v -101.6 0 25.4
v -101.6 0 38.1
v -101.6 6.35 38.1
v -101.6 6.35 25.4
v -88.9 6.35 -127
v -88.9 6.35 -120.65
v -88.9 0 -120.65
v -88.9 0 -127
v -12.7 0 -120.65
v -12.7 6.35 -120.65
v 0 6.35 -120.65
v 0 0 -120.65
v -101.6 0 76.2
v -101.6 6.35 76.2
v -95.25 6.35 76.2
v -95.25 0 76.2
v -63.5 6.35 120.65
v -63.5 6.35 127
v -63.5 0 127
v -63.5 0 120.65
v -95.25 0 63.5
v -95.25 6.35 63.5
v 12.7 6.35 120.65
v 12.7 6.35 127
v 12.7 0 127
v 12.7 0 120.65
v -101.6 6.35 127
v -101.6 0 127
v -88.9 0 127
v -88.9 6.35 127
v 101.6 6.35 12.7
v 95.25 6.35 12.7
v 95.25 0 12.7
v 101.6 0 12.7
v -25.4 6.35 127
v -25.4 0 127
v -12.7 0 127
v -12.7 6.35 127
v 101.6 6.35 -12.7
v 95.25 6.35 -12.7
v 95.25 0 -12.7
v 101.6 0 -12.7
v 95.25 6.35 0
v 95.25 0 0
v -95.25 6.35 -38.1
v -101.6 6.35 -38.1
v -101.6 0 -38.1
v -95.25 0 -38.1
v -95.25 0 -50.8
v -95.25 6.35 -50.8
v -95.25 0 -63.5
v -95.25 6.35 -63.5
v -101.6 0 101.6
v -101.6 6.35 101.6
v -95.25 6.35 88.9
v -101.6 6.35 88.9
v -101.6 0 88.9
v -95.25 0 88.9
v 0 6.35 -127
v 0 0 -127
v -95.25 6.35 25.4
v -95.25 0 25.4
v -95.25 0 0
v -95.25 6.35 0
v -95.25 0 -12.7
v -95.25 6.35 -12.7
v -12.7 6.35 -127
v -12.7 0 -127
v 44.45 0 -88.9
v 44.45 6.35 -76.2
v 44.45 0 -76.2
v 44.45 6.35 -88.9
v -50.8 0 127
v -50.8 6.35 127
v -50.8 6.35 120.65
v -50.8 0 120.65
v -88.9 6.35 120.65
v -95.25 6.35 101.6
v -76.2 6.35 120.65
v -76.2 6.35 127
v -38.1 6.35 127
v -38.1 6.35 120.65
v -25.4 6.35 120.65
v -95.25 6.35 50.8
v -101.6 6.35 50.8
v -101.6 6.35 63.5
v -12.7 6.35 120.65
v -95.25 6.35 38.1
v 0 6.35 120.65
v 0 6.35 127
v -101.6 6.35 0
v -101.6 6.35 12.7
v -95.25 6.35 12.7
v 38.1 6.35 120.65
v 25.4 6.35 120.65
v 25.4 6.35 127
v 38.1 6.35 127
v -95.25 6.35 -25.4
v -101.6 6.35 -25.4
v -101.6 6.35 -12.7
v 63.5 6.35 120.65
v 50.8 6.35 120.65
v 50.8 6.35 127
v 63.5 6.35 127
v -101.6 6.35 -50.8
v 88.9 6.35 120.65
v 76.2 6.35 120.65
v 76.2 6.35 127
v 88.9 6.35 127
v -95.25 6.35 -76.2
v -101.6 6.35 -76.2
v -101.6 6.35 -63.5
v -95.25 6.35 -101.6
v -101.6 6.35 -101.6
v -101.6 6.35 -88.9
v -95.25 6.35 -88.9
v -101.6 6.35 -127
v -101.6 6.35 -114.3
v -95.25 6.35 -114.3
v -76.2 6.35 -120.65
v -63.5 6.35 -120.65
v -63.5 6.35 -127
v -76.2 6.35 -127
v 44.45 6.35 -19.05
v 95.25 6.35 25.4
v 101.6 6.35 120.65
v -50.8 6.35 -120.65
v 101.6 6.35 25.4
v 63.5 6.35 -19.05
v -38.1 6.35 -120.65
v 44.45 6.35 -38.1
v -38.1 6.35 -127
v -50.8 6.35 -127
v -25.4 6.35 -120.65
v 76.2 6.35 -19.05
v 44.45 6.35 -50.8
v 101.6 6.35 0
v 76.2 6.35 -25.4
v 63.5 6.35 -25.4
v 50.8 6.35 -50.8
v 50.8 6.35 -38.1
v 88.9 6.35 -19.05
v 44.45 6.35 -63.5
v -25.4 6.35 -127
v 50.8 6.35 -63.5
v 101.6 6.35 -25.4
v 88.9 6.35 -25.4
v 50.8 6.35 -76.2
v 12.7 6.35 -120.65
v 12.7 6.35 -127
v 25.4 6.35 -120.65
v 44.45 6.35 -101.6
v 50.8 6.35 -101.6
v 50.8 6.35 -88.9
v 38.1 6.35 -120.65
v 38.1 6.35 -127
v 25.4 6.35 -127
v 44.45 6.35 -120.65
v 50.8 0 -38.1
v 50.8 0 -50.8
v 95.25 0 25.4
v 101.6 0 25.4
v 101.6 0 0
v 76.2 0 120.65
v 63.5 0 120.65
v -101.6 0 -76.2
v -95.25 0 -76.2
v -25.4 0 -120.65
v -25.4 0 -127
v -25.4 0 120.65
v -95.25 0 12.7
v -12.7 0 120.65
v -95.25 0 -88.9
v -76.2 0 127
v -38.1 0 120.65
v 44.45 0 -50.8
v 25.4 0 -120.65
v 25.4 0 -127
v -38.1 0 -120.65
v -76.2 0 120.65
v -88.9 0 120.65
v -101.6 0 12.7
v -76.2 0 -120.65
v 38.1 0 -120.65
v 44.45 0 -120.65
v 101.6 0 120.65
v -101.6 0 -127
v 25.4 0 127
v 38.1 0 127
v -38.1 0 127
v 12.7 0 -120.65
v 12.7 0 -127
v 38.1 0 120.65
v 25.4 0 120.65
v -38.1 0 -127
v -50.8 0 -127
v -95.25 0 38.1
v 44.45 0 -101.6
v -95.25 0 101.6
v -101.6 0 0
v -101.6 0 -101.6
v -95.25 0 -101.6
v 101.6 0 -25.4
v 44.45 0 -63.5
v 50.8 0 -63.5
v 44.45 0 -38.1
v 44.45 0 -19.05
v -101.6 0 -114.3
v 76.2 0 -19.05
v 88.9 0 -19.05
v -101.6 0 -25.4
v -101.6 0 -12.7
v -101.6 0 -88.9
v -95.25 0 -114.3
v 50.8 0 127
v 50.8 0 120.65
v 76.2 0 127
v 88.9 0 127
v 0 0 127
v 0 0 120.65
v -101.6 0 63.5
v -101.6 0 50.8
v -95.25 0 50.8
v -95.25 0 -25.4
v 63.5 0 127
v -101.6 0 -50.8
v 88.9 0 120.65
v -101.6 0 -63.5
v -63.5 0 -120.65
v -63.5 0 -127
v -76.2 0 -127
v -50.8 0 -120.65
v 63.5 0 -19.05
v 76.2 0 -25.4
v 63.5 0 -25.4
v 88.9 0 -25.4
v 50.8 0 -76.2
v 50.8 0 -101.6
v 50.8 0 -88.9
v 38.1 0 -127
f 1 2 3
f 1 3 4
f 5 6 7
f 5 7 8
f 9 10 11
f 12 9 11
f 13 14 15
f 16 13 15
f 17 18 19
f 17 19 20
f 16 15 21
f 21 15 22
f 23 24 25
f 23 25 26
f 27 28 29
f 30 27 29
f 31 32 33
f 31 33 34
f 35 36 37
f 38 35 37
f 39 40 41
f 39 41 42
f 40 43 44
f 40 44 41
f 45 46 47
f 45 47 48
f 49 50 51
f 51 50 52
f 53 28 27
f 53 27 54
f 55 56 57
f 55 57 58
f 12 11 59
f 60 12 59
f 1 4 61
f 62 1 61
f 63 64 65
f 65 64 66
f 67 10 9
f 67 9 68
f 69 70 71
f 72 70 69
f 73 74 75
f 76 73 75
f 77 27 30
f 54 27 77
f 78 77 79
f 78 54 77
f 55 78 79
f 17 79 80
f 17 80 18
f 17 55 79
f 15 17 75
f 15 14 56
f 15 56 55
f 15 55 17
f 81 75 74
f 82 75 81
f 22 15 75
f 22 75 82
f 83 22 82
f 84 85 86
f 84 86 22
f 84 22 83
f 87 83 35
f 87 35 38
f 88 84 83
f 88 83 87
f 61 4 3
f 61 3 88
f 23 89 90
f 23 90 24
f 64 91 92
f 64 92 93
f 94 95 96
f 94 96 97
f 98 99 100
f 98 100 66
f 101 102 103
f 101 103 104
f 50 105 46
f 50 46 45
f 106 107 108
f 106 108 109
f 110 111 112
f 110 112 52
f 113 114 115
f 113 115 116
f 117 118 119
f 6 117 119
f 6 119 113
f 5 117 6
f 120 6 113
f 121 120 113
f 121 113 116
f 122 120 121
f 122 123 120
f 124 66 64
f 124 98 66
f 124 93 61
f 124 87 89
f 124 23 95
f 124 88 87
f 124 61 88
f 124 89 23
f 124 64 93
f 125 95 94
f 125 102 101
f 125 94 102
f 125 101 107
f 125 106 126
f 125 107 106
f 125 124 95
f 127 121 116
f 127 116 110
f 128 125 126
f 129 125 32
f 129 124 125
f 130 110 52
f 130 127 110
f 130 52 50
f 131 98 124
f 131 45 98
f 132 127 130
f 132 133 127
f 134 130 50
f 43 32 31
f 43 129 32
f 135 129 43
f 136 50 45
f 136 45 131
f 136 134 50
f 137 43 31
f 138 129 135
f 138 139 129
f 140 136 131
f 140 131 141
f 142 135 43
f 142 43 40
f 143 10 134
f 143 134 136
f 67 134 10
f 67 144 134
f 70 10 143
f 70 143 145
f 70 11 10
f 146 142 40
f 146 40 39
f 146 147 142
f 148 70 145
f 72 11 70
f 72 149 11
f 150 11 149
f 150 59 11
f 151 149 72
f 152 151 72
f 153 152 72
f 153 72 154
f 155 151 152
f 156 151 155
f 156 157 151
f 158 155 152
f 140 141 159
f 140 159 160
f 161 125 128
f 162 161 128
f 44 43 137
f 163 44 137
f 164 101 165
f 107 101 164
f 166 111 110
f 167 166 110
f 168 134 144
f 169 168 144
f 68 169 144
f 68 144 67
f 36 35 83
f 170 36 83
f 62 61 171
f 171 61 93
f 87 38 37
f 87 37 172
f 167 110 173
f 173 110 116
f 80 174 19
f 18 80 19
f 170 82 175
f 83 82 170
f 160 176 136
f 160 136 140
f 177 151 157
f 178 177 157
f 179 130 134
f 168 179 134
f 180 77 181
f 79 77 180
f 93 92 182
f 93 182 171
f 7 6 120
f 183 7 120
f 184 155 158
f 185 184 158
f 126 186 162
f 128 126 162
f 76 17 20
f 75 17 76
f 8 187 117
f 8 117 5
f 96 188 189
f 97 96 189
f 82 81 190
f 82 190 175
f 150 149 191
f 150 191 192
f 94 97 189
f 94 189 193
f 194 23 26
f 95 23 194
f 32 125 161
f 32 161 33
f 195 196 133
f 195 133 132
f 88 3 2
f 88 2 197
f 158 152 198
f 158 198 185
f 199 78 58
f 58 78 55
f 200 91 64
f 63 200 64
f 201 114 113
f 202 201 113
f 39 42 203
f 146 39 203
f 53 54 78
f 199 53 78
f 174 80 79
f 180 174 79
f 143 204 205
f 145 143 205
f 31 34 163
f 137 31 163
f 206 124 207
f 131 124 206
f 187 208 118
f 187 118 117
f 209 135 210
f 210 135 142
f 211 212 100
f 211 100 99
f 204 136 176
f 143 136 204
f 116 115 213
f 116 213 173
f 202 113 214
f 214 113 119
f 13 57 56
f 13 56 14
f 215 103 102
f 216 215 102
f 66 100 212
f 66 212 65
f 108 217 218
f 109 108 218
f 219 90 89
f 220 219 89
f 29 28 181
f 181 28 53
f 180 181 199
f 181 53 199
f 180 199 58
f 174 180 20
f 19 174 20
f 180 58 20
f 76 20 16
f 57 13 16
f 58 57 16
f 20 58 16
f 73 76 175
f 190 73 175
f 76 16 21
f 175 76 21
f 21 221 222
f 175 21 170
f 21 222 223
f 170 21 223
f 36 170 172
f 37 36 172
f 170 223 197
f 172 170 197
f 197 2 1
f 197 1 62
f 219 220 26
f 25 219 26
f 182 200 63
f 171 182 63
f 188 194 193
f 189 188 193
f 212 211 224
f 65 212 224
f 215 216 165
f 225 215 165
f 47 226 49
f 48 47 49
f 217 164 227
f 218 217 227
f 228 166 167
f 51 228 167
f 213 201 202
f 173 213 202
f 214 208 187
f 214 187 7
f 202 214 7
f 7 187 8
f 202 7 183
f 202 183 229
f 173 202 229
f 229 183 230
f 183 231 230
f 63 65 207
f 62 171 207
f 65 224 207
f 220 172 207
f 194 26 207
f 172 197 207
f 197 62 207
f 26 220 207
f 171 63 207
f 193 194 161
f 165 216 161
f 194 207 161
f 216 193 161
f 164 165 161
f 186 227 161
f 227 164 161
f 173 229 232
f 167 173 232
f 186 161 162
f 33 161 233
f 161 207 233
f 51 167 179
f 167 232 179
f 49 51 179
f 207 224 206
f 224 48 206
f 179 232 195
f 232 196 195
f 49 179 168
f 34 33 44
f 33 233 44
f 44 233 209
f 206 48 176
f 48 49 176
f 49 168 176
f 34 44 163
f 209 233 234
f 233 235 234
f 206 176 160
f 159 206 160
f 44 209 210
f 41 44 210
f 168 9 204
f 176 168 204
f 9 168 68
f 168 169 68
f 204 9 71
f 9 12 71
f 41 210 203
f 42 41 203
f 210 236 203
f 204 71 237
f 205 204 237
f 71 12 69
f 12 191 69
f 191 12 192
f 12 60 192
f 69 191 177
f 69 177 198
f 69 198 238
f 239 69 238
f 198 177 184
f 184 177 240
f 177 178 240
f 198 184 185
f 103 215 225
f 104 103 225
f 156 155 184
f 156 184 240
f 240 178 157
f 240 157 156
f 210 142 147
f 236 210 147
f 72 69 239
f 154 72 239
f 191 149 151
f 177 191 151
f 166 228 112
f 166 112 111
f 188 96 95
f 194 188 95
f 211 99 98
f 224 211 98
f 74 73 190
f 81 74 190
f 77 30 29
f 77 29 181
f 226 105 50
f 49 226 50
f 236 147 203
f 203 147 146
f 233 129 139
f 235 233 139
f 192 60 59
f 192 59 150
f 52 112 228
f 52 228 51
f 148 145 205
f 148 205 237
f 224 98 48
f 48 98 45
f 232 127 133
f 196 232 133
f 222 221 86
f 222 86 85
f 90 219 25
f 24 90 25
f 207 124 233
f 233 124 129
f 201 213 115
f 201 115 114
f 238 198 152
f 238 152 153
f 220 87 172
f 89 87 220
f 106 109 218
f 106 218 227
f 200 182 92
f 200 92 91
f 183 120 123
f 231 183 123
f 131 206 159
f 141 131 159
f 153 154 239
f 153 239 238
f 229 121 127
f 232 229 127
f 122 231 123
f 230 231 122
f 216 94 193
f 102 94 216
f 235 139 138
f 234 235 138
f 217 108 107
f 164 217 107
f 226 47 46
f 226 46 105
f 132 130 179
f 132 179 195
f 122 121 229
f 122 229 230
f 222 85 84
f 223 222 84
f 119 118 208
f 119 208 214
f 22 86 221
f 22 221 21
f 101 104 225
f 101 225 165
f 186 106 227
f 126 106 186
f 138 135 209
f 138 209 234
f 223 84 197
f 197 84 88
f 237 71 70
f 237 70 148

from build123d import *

# Parameters (mm, degrees)
SKETCH1_W           = 203.2
SKETCH1_H           = 254
BOSS_EXTRUDE1_DEPTH = 6.35
SKETCH2_W           = 50.8
SKETCH2_H           = 101.6
CUT_EXTRUDE2_DEPTH  = 7.35
SKETCH3_W           = 12.7
SKETCH3_H           = 6.35
CUT_EXTRUDE3_DEPTH  = 7.35
LPATTERN1_COUNT     = 8
LPATTERN1_PITCH     = 25.4
SKETCH4_W           = 6.35
SKETCH4_H           = 12.7
CUT_EXTRUDE4_DEPTH  = 7.35
LPATTERN2_COUNT     = 9
LPATTERN2_PITCH     = 25.4
SKETCH5_W           = 12.7
SKETCH5_H           = 6.35
CUT_EXTRUDE5_DEPTH  = 7.35
LPATTERN3_COUNT     = 6
LPATTERN3_PITCH     = 25.4
SKETCH7_W           = 6.35
SKETCH7_H           = 12.7
CUT_EXTRUDE8_DEPTH  = 7.35
LPATTERN5_COUNT     = 2
LPATTERN5_PITCH     = 25.4
SKETCH8_W           = 12.7
SKETCH8_H           = 6.35
CUT_EXTRUDE9_DEPTH  = 7.35
LPATTERN6_COUNT     = 2
LPATTERN6_PITCH     = 25.4
SKETCH9_W           = 6.35
SKETCH9_H           = 19.05
CUT_EXTRUDE10_DEPTH = 7.35
SKETCH10_W          = 6.35
SKETCH10_H          = 12.7
CUT_EXTRUDE11_DEPTH = 7.35
LPATTERN7_COUNT     = 3
LPATTERN7_PITCH     = 25.4
SKETCH11_W          = 6.35
SKETCH11_H          = 6.35
CUT_EXTRUDE12_DEPTH = 7.35


with BuildPart() as part:
    # Sketch1 → Boss-Extrude1 (new body)
    with BuildSketch(Plane(origin=(0, 0, 0), x_dir=(1, 0, 0), z_dir=(0, 1, 0))):
        Rectangle(SKETCH1_W, SKETCH1_H)
    extrude(amount=BOSS_EXTRUDE1_DEPTH)

    # Sketch2 → Cut-Extrude2 (cut, through all)
    with BuildSketch(Plane(origin=(0, 6.35, 0), x_dir=(1, 0, 0), z_dir=(0, 1, 0))):
        with Locations((76.2, 76.2)):
            Rectangle(SKETCH2_W, SKETCH2_H)
    extrude(amount=-CUT_EXTRUDE2_DEPTH, mode=Mode.SUBTRACT)

    # Sketch3 → Cut-Extrude3 (cut, through all)
    with BuildSketch(Plane(origin=(0, 6.35, 0), x_dir=(1, 0, 0), z_dir=(0, 1, 0))):
        with Locations((95.25, -123.825)):
            Rectangle(SKETCH3_W, SKETCH3_H)
    cut_extrude3 = extrude(amount=-CUT_EXTRUDE3_DEPTH, mode=Mode.SUBTRACT)

    # LPattern1: Cut-Extrude3 ×8
    with Locations(*[(-i * LPATTERN1_PITCH, 0, 0) for i in range(1, LPATTERN1_COUNT)]):
        add(cut_extrude3, mode=Mode.SUBTRACT)

    # Sketch4 → Cut-Extrude4 (cut, through all)
    with BuildSketch(Plane(origin=(0, 6.35, 0), x_dir=(1, 0, 0), z_dir=(0, 1, 0))):
        with Locations((-98.425, -95.25)):
            Rectangle(SKETCH4_W, SKETCH4_H)
    cut_extrude4 = extrude(amount=-CUT_EXTRUDE4_DEPTH, mode=Mode.SUBTRACT)

    # LPattern2: Cut-Extrude4 ×9
    with Locations(*[(0, 0, -i * LPATTERN2_PITCH) for i in range(1, LPATTERN2_COUNT)]):
        add(cut_extrude4, mode=Mode.SUBTRACT)

    # Sketch5 → Cut-Extrude5 (cut, through all)
    with BuildSketch(Plane(origin=(0, 6.35, 0), x_dir=(1, 0, 0), z_dir=(0, 1, 0))):
        with Locations((44.45, 123.825)):
            Rectangle(SKETCH5_W, SKETCH5_H)
    cut_extrude5 = extrude(amount=-CUT_EXTRUDE5_DEPTH, mode=Mode.SUBTRACT)

    # LPattern3: Cut-Extrude5 ×6
    with Locations(*[(-i * LPATTERN3_PITCH, 0, 0) for i in range(1, LPATTERN3_COUNT)]):
        add(cut_extrude5, mode=Mode.SUBTRACT)

    # Sketch7 → Cut-Extrude8 (cut, through all)
    with BuildSketch(Plane(origin=(0, 6.35, 0), x_dir=(1, 0, 0), z_dir=(0, 1, 0))):
        with Locations((98.425, 6.35)):
            Rectangle(SKETCH7_W, SKETCH7_H)
    cut_extrude8 = extrude(amount=-CUT_EXTRUDE8_DEPTH, mode=Mode.SUBTRACT)

    # LPattern5: Cut-Extrude8 ×2
    with Locations(*[(0, 0, i * LPATTERN5_PITCH) for i in range(1, LPATTERN5_COUNT)]):
        add(cut_extrude8, mode=Mode.SUBTRACT)

    # Sketch8 → Cut-Extrude9 (cut, through all)
    with BuildSketch(Plane(origin=(0, 6.35, 0), x_dir=(1, 0, 0), z_dir=(0, 1, 0))):
        with Locations((82.55, 22.225)):
            Rectangle(SKETCH8_W, SKETCH8_H)
    cut_extrude9 = extrude(amount=-CUT_EXTRUDE9_DEPTH, mode=Mode.SUBTRACT)

    # LPattern6: Cut-Extrude9 ×2
    with Locations(*[(-i * LPATTERN6_PITCH, 0, 0) for i in range(1, LPATTERN6_COUNT)]):
        add(cut_extrude9, mode=Mode.SUBTRACT)

    # Sketch9 → Cut-Extrude10 (cut, through all)
    with BuildSketch(Plane(origin=(0, 6.35, 0), x_dir=(1, 0, 0), z_dir=(0, 1, 0))):
        with Locations((47.625, 111.125)):
            Rectangle(SKETCH9_W, SKETCH9_H)
    extrude(amount=-CUT_EXTRUDE10_DEPTH, mode=Mode.SUBTRACT)

    # Sketch10 → Cut-Extrude11 (cut, through all)
    with BuildSketch(Plane(origin=(0, 6.35, 0), x_dir=(1, 0, 0), z_dir=(0, 1, 0))):
        with Locations((47.625, 82.55)):
            Rectangle(SKETCH10_W, SKETCH10_H)
    cut_extrude11 = extrude(amount=-CUT_EXTRUDE11_DEPTH, mode=Mode.SUBTRACT)

    # LPattern7: Cut-Extrude11 ×3
    with Locations(*[(0, 0, i * LPATTERN7_PITCH) for i in range(1, LPATTERN7_COUNT)]):
        add(cut_extrude11, mode=Mode.SUBTRACT)

    # Sketch11 → Cut-Extrude12 (cut, through all)
    with BuildSketch(Plane(origin=(0, 6.35, 0), x_dir=(1, 0, 0), z_dir=(0, 1, 0))):
        with Locations((47.625, 22.225)):
            Rectangle(SKETCH11_W, SKETCH11_H)
    extrude(amount=-CUT_EXTRUDE12_DEPTH, mode=Mode.SUBTRACT)


solid = part.part
